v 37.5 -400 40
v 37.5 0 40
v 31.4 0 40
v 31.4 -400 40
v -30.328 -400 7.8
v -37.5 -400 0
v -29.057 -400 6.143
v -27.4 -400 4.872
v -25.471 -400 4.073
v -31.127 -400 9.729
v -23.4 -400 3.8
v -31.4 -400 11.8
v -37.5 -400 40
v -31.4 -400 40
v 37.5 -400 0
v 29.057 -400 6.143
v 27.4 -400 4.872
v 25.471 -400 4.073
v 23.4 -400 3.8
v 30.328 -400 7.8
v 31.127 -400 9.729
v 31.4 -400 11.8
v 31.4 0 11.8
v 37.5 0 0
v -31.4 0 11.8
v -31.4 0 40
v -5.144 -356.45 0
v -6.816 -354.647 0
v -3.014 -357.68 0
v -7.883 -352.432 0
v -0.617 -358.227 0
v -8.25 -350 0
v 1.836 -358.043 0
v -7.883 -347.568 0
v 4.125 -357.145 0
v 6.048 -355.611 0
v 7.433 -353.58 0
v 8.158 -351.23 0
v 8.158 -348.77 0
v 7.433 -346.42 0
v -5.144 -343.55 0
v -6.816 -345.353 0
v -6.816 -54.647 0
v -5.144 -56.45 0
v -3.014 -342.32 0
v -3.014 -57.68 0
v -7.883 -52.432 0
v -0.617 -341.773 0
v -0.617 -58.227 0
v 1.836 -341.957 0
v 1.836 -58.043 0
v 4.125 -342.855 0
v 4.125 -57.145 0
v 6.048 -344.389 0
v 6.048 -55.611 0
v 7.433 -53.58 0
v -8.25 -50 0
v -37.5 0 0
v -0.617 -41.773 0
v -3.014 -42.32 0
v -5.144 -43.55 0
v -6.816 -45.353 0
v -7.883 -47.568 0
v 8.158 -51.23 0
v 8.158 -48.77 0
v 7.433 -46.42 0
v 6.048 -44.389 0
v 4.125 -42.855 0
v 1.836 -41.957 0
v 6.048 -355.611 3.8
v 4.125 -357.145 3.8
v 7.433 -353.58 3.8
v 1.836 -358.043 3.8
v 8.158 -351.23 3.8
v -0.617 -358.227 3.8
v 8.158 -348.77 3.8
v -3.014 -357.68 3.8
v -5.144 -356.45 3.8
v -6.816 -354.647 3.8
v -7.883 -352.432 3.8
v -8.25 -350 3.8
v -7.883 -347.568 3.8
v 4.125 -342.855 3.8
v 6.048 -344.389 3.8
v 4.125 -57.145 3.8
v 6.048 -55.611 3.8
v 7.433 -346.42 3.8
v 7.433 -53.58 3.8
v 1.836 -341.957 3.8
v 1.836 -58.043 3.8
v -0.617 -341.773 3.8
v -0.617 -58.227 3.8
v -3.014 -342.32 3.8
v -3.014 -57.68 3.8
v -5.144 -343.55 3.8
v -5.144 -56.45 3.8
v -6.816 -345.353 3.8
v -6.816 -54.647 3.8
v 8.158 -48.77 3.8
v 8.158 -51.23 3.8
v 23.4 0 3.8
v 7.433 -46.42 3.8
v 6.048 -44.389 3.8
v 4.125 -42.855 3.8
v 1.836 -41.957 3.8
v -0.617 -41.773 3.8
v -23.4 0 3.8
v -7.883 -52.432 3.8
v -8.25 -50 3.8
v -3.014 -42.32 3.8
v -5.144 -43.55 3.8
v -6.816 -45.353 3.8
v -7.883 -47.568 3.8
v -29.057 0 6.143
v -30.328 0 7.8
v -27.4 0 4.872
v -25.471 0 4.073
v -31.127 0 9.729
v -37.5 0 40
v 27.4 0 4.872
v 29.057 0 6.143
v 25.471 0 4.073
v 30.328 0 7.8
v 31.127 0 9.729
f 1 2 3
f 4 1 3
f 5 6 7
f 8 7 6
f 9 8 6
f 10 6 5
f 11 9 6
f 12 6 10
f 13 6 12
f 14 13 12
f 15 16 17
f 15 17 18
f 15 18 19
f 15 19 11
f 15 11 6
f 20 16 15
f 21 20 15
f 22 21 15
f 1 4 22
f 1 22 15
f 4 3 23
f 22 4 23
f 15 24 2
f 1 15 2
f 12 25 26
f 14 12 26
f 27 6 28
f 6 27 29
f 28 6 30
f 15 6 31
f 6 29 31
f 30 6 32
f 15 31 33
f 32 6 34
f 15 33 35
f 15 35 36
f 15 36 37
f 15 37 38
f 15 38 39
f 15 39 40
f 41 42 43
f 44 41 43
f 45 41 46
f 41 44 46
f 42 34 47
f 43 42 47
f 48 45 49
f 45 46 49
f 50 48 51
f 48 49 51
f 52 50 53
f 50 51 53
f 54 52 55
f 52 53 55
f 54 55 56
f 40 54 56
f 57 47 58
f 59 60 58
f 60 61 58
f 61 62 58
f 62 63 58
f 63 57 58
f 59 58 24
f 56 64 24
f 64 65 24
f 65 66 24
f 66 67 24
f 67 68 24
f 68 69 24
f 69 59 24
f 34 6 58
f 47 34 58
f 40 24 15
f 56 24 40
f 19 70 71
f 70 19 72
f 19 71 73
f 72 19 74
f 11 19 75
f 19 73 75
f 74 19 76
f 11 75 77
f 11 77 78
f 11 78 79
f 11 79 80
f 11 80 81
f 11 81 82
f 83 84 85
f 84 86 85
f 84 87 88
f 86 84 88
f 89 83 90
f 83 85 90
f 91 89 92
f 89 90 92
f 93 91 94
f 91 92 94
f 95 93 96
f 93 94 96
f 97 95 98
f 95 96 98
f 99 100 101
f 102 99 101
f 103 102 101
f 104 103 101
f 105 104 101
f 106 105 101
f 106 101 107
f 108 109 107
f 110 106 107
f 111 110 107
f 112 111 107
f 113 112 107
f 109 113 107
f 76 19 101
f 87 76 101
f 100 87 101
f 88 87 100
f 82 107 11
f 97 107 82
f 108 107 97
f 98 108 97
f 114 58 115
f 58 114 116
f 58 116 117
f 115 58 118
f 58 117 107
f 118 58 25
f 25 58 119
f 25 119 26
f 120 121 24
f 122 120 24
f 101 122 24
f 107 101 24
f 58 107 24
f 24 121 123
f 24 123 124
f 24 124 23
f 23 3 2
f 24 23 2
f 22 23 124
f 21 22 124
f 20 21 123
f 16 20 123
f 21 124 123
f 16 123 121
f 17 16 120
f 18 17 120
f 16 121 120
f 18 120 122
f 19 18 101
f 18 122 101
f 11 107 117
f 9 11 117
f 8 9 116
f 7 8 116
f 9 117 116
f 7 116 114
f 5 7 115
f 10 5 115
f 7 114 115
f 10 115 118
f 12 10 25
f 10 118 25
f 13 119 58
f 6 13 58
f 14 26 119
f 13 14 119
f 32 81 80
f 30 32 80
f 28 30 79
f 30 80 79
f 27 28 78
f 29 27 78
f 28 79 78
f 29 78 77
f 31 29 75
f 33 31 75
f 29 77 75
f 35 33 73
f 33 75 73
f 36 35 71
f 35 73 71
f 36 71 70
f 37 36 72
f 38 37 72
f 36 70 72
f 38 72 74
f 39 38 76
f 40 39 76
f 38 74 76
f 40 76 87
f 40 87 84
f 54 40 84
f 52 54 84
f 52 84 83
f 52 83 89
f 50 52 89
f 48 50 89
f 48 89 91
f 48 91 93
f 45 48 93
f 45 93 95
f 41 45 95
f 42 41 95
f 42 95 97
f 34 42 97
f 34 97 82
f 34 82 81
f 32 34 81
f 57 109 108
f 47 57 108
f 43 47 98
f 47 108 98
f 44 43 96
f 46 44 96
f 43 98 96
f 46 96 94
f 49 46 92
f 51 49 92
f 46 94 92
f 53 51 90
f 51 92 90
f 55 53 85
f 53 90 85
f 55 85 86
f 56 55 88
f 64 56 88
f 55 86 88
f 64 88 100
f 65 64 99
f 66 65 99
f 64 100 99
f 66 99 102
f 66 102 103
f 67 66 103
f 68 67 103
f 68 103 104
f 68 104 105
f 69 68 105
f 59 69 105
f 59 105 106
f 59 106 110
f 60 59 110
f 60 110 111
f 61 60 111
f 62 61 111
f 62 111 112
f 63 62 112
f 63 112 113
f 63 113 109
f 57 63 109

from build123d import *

# Parameters (mm, degrees)
F1_DEPTH = 400
F3_D     = 16.5


with BuildPart() as f1:
    # F0 (on Front) → F1 (new body)
    with BuildSketch(Plane.XZ):
        with BuildLine():
            Line((-37.5, 0), (0, 0))
            Line((0, 0), (37.5, 0))
            Line((37.5, 0), (37.5, 40))
            Line((37.5, 40), (31.4, 40))
            Line((31.4, 40), (31.4, 11.8))
            ThreePointArc((31.4, 11.8), (29.0568542495, 6.1431457505), (23.4, 3.8))
            Line((23.4, 3.8), (0, 3.8))
            Line((0, 3.8), (-23.4, 3.8))
            ThreePointArc((-23.4, 3.8), (-29.0568542495, 6.1431457505), (-31.4, 11.8))
            Line((-31.4, 11.8), (-31.4, 40))
            Line((-31.4, 40), (-37.5, 40))
            Line((-37.5, 40), (-37.5, 0))
        make_face()
    extrude(amount=F1_DEPTH)

    # F3 (through all)
    with Locations(Plane(origin=(0, 0, 0), x_dir=(1, 0, 0), z_dir=(0, 0, -1))):
        with Locations((0, 50), (0, 350)):
            Hole(F3_D / 2)


solid = f1.part
